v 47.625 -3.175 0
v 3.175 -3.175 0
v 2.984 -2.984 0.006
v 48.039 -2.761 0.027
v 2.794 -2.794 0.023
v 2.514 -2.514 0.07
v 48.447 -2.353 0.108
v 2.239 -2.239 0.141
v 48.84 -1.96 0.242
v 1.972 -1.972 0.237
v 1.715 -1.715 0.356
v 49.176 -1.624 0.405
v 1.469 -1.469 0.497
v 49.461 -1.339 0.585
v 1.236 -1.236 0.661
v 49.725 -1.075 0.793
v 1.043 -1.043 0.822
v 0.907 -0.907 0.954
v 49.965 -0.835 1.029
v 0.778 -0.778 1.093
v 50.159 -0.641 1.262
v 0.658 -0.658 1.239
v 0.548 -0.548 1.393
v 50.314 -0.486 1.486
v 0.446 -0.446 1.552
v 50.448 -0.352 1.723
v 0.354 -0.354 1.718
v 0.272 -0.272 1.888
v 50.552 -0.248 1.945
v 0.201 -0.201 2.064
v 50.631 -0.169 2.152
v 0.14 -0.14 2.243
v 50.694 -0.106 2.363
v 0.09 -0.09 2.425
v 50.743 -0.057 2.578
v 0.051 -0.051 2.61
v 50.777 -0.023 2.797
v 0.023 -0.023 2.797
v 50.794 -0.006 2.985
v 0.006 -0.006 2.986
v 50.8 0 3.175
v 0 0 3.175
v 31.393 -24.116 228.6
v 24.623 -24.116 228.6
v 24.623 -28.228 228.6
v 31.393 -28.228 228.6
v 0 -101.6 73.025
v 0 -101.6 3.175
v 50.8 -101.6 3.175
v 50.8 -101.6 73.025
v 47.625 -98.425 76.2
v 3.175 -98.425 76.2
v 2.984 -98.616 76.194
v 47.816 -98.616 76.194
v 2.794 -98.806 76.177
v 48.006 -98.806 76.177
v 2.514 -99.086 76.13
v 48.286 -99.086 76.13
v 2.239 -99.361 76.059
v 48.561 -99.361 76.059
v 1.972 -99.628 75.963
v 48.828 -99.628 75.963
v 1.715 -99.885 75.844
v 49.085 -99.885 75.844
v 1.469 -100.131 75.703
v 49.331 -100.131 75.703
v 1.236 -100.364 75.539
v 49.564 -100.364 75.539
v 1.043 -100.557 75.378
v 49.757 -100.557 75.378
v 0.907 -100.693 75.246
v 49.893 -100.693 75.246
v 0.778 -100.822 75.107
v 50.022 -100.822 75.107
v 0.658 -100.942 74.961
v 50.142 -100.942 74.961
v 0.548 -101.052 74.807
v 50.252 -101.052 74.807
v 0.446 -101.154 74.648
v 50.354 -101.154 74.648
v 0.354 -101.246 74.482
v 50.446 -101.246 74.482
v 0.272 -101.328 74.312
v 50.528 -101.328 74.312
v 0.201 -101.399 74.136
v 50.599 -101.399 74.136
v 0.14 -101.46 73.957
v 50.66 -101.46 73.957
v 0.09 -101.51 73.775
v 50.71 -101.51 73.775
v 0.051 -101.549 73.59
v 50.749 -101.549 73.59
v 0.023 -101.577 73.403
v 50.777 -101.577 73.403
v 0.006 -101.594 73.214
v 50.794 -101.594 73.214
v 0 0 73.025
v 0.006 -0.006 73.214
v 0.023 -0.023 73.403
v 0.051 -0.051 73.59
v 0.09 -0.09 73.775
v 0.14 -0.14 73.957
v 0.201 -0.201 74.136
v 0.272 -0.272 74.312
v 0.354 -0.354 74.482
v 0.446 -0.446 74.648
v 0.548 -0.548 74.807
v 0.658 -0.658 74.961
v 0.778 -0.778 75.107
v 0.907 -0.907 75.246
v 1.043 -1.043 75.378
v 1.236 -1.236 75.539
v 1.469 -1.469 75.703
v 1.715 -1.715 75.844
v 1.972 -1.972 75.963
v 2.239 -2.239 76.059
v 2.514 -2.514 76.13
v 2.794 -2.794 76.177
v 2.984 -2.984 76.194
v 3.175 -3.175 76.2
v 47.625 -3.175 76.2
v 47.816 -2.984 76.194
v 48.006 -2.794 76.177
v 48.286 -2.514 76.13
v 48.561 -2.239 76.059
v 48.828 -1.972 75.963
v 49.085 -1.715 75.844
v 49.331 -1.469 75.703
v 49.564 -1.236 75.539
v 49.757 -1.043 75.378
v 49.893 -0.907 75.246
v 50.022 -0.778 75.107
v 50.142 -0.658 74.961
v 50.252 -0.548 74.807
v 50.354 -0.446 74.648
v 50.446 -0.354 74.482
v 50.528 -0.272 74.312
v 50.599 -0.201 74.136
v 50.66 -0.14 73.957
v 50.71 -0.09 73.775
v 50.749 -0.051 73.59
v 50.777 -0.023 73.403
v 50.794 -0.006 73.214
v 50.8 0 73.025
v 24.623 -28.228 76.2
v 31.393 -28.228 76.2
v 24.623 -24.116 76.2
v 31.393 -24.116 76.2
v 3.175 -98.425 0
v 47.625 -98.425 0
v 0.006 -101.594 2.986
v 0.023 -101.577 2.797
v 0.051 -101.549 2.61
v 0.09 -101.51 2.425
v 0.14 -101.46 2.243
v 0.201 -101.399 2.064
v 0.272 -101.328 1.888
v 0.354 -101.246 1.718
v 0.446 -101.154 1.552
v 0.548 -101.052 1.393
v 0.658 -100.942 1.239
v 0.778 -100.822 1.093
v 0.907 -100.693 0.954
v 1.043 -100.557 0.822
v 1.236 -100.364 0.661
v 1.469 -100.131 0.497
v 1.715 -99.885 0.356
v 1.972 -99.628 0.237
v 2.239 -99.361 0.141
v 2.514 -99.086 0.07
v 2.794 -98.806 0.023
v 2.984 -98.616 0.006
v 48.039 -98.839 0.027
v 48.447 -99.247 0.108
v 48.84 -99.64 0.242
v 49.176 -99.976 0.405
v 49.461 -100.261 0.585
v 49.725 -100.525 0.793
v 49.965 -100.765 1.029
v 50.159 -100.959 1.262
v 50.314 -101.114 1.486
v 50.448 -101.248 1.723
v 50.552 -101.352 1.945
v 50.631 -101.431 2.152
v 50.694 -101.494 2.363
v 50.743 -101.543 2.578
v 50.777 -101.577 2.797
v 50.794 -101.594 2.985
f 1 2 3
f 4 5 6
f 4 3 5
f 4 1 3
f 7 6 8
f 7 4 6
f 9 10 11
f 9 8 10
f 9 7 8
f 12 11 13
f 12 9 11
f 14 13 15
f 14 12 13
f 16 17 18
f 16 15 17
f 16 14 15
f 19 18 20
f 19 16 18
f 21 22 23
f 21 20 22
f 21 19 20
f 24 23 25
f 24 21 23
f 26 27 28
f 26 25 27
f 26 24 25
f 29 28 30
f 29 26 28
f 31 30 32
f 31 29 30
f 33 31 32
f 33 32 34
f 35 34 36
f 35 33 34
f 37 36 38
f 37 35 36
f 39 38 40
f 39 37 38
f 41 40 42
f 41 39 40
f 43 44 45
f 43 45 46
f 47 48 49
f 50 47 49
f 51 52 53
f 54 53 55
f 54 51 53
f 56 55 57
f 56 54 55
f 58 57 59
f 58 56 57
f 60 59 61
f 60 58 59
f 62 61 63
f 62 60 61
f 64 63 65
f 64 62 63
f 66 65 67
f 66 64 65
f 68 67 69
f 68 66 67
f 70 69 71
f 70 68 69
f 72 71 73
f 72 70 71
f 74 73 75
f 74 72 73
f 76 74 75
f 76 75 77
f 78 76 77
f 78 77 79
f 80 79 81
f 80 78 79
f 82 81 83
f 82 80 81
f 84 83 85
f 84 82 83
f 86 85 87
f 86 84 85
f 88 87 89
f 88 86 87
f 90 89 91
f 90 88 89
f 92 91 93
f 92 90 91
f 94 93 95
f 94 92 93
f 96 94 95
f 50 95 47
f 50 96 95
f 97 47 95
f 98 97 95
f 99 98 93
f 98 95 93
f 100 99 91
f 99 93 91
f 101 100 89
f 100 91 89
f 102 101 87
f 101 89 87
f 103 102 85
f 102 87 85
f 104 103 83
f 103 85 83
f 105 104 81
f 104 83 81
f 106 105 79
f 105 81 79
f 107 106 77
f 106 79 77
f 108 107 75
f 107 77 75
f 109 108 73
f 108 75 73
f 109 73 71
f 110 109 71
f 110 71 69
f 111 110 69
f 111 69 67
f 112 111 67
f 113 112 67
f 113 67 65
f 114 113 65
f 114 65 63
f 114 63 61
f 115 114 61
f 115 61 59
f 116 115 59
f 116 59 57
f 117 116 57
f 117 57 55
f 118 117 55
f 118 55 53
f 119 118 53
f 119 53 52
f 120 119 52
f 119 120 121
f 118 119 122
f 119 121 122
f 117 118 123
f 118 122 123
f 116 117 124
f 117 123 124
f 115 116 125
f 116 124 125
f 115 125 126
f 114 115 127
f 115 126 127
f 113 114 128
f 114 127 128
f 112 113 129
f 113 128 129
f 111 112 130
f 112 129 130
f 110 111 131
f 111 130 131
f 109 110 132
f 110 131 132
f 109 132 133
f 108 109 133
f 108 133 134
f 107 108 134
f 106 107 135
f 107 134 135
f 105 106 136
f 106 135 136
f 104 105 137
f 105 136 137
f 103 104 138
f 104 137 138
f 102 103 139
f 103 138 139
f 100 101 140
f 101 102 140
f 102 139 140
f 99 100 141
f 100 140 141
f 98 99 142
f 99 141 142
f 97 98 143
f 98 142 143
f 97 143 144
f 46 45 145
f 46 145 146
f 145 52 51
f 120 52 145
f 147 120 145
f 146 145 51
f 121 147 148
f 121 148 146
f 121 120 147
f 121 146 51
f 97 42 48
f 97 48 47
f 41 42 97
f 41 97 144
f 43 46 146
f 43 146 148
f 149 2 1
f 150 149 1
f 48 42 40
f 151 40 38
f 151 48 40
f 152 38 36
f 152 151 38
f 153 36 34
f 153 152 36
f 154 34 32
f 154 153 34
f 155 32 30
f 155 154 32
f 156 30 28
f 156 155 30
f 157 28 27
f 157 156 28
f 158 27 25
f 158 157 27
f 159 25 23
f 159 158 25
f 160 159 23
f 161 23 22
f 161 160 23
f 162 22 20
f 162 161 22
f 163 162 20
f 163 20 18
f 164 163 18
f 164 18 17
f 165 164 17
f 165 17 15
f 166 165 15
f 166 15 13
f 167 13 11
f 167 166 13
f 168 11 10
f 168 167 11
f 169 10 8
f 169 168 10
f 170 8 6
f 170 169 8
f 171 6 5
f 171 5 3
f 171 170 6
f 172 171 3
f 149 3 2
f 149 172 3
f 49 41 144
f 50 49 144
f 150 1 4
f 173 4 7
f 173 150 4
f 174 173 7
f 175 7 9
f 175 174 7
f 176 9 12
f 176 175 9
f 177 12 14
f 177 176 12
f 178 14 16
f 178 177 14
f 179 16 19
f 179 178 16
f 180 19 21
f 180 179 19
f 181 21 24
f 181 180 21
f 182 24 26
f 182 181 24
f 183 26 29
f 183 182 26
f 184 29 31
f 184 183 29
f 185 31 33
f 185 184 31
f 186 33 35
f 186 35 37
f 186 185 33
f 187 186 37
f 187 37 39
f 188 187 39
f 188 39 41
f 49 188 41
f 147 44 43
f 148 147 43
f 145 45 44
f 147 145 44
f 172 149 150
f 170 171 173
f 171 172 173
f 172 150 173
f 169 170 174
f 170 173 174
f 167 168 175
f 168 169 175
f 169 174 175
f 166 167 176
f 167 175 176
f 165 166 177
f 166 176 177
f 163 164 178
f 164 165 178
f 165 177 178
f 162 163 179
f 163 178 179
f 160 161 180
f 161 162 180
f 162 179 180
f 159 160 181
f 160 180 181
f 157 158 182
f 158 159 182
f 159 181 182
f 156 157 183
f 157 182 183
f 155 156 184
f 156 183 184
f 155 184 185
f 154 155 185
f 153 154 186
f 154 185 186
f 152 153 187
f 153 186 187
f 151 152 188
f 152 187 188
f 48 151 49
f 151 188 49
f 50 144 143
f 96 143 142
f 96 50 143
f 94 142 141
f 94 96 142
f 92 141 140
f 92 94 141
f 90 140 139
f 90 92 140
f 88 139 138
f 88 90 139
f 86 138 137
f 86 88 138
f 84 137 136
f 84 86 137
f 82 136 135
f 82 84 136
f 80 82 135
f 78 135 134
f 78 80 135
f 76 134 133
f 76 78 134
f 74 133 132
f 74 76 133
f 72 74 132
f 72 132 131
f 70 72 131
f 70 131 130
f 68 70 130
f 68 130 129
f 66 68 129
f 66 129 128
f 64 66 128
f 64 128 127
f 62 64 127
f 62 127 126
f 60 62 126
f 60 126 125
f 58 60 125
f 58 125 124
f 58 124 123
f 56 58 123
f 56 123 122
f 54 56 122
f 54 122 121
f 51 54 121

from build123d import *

# Parameters (mm, degrees)
F0_W     = 50.8
F0_H     = 76.2
F1_DEPTH = 101.6
F2_R     = 3.175
F3_W     = 6.770242
F3_H     = 4.11195
F4_DEPTH = 152.4


with BuildPart() as f1:
    # F0 (on Front) → F1 (new body)
    with BuildSketch(Plane.XZ):
        with Locations((25.4, 38.1)):
            Rectangle(F0_W, F0_H)
    extrude(amount=F1_DEPTH)

    # F2
    f2_edges = [f1.edges().sort_by_distance(p)[0] for p in [
        (50.8, -50.8, 76.2),
        (0, -50.8, 76.2),
        (25.4, 0, 76.2),
        (25.4, -101.6, 76.2),
        (0, -50.8, 0),
        (50.8, -50.8, 0),
        (25.4, 0, 0),
        (25.4, -101.6, 0),
    ]]
    fillet(f2_edges, radius=F2_R)

    # F3 (on face) → F4 (join)
    with BuildSketch(Plane.XY.offset(76.2)):
        with Locations((28.007837, -26.172377)):
            Rectangle(F3_W, F3_H)
    extrude(amount=F4_DEPTH)


solid = f1.part
